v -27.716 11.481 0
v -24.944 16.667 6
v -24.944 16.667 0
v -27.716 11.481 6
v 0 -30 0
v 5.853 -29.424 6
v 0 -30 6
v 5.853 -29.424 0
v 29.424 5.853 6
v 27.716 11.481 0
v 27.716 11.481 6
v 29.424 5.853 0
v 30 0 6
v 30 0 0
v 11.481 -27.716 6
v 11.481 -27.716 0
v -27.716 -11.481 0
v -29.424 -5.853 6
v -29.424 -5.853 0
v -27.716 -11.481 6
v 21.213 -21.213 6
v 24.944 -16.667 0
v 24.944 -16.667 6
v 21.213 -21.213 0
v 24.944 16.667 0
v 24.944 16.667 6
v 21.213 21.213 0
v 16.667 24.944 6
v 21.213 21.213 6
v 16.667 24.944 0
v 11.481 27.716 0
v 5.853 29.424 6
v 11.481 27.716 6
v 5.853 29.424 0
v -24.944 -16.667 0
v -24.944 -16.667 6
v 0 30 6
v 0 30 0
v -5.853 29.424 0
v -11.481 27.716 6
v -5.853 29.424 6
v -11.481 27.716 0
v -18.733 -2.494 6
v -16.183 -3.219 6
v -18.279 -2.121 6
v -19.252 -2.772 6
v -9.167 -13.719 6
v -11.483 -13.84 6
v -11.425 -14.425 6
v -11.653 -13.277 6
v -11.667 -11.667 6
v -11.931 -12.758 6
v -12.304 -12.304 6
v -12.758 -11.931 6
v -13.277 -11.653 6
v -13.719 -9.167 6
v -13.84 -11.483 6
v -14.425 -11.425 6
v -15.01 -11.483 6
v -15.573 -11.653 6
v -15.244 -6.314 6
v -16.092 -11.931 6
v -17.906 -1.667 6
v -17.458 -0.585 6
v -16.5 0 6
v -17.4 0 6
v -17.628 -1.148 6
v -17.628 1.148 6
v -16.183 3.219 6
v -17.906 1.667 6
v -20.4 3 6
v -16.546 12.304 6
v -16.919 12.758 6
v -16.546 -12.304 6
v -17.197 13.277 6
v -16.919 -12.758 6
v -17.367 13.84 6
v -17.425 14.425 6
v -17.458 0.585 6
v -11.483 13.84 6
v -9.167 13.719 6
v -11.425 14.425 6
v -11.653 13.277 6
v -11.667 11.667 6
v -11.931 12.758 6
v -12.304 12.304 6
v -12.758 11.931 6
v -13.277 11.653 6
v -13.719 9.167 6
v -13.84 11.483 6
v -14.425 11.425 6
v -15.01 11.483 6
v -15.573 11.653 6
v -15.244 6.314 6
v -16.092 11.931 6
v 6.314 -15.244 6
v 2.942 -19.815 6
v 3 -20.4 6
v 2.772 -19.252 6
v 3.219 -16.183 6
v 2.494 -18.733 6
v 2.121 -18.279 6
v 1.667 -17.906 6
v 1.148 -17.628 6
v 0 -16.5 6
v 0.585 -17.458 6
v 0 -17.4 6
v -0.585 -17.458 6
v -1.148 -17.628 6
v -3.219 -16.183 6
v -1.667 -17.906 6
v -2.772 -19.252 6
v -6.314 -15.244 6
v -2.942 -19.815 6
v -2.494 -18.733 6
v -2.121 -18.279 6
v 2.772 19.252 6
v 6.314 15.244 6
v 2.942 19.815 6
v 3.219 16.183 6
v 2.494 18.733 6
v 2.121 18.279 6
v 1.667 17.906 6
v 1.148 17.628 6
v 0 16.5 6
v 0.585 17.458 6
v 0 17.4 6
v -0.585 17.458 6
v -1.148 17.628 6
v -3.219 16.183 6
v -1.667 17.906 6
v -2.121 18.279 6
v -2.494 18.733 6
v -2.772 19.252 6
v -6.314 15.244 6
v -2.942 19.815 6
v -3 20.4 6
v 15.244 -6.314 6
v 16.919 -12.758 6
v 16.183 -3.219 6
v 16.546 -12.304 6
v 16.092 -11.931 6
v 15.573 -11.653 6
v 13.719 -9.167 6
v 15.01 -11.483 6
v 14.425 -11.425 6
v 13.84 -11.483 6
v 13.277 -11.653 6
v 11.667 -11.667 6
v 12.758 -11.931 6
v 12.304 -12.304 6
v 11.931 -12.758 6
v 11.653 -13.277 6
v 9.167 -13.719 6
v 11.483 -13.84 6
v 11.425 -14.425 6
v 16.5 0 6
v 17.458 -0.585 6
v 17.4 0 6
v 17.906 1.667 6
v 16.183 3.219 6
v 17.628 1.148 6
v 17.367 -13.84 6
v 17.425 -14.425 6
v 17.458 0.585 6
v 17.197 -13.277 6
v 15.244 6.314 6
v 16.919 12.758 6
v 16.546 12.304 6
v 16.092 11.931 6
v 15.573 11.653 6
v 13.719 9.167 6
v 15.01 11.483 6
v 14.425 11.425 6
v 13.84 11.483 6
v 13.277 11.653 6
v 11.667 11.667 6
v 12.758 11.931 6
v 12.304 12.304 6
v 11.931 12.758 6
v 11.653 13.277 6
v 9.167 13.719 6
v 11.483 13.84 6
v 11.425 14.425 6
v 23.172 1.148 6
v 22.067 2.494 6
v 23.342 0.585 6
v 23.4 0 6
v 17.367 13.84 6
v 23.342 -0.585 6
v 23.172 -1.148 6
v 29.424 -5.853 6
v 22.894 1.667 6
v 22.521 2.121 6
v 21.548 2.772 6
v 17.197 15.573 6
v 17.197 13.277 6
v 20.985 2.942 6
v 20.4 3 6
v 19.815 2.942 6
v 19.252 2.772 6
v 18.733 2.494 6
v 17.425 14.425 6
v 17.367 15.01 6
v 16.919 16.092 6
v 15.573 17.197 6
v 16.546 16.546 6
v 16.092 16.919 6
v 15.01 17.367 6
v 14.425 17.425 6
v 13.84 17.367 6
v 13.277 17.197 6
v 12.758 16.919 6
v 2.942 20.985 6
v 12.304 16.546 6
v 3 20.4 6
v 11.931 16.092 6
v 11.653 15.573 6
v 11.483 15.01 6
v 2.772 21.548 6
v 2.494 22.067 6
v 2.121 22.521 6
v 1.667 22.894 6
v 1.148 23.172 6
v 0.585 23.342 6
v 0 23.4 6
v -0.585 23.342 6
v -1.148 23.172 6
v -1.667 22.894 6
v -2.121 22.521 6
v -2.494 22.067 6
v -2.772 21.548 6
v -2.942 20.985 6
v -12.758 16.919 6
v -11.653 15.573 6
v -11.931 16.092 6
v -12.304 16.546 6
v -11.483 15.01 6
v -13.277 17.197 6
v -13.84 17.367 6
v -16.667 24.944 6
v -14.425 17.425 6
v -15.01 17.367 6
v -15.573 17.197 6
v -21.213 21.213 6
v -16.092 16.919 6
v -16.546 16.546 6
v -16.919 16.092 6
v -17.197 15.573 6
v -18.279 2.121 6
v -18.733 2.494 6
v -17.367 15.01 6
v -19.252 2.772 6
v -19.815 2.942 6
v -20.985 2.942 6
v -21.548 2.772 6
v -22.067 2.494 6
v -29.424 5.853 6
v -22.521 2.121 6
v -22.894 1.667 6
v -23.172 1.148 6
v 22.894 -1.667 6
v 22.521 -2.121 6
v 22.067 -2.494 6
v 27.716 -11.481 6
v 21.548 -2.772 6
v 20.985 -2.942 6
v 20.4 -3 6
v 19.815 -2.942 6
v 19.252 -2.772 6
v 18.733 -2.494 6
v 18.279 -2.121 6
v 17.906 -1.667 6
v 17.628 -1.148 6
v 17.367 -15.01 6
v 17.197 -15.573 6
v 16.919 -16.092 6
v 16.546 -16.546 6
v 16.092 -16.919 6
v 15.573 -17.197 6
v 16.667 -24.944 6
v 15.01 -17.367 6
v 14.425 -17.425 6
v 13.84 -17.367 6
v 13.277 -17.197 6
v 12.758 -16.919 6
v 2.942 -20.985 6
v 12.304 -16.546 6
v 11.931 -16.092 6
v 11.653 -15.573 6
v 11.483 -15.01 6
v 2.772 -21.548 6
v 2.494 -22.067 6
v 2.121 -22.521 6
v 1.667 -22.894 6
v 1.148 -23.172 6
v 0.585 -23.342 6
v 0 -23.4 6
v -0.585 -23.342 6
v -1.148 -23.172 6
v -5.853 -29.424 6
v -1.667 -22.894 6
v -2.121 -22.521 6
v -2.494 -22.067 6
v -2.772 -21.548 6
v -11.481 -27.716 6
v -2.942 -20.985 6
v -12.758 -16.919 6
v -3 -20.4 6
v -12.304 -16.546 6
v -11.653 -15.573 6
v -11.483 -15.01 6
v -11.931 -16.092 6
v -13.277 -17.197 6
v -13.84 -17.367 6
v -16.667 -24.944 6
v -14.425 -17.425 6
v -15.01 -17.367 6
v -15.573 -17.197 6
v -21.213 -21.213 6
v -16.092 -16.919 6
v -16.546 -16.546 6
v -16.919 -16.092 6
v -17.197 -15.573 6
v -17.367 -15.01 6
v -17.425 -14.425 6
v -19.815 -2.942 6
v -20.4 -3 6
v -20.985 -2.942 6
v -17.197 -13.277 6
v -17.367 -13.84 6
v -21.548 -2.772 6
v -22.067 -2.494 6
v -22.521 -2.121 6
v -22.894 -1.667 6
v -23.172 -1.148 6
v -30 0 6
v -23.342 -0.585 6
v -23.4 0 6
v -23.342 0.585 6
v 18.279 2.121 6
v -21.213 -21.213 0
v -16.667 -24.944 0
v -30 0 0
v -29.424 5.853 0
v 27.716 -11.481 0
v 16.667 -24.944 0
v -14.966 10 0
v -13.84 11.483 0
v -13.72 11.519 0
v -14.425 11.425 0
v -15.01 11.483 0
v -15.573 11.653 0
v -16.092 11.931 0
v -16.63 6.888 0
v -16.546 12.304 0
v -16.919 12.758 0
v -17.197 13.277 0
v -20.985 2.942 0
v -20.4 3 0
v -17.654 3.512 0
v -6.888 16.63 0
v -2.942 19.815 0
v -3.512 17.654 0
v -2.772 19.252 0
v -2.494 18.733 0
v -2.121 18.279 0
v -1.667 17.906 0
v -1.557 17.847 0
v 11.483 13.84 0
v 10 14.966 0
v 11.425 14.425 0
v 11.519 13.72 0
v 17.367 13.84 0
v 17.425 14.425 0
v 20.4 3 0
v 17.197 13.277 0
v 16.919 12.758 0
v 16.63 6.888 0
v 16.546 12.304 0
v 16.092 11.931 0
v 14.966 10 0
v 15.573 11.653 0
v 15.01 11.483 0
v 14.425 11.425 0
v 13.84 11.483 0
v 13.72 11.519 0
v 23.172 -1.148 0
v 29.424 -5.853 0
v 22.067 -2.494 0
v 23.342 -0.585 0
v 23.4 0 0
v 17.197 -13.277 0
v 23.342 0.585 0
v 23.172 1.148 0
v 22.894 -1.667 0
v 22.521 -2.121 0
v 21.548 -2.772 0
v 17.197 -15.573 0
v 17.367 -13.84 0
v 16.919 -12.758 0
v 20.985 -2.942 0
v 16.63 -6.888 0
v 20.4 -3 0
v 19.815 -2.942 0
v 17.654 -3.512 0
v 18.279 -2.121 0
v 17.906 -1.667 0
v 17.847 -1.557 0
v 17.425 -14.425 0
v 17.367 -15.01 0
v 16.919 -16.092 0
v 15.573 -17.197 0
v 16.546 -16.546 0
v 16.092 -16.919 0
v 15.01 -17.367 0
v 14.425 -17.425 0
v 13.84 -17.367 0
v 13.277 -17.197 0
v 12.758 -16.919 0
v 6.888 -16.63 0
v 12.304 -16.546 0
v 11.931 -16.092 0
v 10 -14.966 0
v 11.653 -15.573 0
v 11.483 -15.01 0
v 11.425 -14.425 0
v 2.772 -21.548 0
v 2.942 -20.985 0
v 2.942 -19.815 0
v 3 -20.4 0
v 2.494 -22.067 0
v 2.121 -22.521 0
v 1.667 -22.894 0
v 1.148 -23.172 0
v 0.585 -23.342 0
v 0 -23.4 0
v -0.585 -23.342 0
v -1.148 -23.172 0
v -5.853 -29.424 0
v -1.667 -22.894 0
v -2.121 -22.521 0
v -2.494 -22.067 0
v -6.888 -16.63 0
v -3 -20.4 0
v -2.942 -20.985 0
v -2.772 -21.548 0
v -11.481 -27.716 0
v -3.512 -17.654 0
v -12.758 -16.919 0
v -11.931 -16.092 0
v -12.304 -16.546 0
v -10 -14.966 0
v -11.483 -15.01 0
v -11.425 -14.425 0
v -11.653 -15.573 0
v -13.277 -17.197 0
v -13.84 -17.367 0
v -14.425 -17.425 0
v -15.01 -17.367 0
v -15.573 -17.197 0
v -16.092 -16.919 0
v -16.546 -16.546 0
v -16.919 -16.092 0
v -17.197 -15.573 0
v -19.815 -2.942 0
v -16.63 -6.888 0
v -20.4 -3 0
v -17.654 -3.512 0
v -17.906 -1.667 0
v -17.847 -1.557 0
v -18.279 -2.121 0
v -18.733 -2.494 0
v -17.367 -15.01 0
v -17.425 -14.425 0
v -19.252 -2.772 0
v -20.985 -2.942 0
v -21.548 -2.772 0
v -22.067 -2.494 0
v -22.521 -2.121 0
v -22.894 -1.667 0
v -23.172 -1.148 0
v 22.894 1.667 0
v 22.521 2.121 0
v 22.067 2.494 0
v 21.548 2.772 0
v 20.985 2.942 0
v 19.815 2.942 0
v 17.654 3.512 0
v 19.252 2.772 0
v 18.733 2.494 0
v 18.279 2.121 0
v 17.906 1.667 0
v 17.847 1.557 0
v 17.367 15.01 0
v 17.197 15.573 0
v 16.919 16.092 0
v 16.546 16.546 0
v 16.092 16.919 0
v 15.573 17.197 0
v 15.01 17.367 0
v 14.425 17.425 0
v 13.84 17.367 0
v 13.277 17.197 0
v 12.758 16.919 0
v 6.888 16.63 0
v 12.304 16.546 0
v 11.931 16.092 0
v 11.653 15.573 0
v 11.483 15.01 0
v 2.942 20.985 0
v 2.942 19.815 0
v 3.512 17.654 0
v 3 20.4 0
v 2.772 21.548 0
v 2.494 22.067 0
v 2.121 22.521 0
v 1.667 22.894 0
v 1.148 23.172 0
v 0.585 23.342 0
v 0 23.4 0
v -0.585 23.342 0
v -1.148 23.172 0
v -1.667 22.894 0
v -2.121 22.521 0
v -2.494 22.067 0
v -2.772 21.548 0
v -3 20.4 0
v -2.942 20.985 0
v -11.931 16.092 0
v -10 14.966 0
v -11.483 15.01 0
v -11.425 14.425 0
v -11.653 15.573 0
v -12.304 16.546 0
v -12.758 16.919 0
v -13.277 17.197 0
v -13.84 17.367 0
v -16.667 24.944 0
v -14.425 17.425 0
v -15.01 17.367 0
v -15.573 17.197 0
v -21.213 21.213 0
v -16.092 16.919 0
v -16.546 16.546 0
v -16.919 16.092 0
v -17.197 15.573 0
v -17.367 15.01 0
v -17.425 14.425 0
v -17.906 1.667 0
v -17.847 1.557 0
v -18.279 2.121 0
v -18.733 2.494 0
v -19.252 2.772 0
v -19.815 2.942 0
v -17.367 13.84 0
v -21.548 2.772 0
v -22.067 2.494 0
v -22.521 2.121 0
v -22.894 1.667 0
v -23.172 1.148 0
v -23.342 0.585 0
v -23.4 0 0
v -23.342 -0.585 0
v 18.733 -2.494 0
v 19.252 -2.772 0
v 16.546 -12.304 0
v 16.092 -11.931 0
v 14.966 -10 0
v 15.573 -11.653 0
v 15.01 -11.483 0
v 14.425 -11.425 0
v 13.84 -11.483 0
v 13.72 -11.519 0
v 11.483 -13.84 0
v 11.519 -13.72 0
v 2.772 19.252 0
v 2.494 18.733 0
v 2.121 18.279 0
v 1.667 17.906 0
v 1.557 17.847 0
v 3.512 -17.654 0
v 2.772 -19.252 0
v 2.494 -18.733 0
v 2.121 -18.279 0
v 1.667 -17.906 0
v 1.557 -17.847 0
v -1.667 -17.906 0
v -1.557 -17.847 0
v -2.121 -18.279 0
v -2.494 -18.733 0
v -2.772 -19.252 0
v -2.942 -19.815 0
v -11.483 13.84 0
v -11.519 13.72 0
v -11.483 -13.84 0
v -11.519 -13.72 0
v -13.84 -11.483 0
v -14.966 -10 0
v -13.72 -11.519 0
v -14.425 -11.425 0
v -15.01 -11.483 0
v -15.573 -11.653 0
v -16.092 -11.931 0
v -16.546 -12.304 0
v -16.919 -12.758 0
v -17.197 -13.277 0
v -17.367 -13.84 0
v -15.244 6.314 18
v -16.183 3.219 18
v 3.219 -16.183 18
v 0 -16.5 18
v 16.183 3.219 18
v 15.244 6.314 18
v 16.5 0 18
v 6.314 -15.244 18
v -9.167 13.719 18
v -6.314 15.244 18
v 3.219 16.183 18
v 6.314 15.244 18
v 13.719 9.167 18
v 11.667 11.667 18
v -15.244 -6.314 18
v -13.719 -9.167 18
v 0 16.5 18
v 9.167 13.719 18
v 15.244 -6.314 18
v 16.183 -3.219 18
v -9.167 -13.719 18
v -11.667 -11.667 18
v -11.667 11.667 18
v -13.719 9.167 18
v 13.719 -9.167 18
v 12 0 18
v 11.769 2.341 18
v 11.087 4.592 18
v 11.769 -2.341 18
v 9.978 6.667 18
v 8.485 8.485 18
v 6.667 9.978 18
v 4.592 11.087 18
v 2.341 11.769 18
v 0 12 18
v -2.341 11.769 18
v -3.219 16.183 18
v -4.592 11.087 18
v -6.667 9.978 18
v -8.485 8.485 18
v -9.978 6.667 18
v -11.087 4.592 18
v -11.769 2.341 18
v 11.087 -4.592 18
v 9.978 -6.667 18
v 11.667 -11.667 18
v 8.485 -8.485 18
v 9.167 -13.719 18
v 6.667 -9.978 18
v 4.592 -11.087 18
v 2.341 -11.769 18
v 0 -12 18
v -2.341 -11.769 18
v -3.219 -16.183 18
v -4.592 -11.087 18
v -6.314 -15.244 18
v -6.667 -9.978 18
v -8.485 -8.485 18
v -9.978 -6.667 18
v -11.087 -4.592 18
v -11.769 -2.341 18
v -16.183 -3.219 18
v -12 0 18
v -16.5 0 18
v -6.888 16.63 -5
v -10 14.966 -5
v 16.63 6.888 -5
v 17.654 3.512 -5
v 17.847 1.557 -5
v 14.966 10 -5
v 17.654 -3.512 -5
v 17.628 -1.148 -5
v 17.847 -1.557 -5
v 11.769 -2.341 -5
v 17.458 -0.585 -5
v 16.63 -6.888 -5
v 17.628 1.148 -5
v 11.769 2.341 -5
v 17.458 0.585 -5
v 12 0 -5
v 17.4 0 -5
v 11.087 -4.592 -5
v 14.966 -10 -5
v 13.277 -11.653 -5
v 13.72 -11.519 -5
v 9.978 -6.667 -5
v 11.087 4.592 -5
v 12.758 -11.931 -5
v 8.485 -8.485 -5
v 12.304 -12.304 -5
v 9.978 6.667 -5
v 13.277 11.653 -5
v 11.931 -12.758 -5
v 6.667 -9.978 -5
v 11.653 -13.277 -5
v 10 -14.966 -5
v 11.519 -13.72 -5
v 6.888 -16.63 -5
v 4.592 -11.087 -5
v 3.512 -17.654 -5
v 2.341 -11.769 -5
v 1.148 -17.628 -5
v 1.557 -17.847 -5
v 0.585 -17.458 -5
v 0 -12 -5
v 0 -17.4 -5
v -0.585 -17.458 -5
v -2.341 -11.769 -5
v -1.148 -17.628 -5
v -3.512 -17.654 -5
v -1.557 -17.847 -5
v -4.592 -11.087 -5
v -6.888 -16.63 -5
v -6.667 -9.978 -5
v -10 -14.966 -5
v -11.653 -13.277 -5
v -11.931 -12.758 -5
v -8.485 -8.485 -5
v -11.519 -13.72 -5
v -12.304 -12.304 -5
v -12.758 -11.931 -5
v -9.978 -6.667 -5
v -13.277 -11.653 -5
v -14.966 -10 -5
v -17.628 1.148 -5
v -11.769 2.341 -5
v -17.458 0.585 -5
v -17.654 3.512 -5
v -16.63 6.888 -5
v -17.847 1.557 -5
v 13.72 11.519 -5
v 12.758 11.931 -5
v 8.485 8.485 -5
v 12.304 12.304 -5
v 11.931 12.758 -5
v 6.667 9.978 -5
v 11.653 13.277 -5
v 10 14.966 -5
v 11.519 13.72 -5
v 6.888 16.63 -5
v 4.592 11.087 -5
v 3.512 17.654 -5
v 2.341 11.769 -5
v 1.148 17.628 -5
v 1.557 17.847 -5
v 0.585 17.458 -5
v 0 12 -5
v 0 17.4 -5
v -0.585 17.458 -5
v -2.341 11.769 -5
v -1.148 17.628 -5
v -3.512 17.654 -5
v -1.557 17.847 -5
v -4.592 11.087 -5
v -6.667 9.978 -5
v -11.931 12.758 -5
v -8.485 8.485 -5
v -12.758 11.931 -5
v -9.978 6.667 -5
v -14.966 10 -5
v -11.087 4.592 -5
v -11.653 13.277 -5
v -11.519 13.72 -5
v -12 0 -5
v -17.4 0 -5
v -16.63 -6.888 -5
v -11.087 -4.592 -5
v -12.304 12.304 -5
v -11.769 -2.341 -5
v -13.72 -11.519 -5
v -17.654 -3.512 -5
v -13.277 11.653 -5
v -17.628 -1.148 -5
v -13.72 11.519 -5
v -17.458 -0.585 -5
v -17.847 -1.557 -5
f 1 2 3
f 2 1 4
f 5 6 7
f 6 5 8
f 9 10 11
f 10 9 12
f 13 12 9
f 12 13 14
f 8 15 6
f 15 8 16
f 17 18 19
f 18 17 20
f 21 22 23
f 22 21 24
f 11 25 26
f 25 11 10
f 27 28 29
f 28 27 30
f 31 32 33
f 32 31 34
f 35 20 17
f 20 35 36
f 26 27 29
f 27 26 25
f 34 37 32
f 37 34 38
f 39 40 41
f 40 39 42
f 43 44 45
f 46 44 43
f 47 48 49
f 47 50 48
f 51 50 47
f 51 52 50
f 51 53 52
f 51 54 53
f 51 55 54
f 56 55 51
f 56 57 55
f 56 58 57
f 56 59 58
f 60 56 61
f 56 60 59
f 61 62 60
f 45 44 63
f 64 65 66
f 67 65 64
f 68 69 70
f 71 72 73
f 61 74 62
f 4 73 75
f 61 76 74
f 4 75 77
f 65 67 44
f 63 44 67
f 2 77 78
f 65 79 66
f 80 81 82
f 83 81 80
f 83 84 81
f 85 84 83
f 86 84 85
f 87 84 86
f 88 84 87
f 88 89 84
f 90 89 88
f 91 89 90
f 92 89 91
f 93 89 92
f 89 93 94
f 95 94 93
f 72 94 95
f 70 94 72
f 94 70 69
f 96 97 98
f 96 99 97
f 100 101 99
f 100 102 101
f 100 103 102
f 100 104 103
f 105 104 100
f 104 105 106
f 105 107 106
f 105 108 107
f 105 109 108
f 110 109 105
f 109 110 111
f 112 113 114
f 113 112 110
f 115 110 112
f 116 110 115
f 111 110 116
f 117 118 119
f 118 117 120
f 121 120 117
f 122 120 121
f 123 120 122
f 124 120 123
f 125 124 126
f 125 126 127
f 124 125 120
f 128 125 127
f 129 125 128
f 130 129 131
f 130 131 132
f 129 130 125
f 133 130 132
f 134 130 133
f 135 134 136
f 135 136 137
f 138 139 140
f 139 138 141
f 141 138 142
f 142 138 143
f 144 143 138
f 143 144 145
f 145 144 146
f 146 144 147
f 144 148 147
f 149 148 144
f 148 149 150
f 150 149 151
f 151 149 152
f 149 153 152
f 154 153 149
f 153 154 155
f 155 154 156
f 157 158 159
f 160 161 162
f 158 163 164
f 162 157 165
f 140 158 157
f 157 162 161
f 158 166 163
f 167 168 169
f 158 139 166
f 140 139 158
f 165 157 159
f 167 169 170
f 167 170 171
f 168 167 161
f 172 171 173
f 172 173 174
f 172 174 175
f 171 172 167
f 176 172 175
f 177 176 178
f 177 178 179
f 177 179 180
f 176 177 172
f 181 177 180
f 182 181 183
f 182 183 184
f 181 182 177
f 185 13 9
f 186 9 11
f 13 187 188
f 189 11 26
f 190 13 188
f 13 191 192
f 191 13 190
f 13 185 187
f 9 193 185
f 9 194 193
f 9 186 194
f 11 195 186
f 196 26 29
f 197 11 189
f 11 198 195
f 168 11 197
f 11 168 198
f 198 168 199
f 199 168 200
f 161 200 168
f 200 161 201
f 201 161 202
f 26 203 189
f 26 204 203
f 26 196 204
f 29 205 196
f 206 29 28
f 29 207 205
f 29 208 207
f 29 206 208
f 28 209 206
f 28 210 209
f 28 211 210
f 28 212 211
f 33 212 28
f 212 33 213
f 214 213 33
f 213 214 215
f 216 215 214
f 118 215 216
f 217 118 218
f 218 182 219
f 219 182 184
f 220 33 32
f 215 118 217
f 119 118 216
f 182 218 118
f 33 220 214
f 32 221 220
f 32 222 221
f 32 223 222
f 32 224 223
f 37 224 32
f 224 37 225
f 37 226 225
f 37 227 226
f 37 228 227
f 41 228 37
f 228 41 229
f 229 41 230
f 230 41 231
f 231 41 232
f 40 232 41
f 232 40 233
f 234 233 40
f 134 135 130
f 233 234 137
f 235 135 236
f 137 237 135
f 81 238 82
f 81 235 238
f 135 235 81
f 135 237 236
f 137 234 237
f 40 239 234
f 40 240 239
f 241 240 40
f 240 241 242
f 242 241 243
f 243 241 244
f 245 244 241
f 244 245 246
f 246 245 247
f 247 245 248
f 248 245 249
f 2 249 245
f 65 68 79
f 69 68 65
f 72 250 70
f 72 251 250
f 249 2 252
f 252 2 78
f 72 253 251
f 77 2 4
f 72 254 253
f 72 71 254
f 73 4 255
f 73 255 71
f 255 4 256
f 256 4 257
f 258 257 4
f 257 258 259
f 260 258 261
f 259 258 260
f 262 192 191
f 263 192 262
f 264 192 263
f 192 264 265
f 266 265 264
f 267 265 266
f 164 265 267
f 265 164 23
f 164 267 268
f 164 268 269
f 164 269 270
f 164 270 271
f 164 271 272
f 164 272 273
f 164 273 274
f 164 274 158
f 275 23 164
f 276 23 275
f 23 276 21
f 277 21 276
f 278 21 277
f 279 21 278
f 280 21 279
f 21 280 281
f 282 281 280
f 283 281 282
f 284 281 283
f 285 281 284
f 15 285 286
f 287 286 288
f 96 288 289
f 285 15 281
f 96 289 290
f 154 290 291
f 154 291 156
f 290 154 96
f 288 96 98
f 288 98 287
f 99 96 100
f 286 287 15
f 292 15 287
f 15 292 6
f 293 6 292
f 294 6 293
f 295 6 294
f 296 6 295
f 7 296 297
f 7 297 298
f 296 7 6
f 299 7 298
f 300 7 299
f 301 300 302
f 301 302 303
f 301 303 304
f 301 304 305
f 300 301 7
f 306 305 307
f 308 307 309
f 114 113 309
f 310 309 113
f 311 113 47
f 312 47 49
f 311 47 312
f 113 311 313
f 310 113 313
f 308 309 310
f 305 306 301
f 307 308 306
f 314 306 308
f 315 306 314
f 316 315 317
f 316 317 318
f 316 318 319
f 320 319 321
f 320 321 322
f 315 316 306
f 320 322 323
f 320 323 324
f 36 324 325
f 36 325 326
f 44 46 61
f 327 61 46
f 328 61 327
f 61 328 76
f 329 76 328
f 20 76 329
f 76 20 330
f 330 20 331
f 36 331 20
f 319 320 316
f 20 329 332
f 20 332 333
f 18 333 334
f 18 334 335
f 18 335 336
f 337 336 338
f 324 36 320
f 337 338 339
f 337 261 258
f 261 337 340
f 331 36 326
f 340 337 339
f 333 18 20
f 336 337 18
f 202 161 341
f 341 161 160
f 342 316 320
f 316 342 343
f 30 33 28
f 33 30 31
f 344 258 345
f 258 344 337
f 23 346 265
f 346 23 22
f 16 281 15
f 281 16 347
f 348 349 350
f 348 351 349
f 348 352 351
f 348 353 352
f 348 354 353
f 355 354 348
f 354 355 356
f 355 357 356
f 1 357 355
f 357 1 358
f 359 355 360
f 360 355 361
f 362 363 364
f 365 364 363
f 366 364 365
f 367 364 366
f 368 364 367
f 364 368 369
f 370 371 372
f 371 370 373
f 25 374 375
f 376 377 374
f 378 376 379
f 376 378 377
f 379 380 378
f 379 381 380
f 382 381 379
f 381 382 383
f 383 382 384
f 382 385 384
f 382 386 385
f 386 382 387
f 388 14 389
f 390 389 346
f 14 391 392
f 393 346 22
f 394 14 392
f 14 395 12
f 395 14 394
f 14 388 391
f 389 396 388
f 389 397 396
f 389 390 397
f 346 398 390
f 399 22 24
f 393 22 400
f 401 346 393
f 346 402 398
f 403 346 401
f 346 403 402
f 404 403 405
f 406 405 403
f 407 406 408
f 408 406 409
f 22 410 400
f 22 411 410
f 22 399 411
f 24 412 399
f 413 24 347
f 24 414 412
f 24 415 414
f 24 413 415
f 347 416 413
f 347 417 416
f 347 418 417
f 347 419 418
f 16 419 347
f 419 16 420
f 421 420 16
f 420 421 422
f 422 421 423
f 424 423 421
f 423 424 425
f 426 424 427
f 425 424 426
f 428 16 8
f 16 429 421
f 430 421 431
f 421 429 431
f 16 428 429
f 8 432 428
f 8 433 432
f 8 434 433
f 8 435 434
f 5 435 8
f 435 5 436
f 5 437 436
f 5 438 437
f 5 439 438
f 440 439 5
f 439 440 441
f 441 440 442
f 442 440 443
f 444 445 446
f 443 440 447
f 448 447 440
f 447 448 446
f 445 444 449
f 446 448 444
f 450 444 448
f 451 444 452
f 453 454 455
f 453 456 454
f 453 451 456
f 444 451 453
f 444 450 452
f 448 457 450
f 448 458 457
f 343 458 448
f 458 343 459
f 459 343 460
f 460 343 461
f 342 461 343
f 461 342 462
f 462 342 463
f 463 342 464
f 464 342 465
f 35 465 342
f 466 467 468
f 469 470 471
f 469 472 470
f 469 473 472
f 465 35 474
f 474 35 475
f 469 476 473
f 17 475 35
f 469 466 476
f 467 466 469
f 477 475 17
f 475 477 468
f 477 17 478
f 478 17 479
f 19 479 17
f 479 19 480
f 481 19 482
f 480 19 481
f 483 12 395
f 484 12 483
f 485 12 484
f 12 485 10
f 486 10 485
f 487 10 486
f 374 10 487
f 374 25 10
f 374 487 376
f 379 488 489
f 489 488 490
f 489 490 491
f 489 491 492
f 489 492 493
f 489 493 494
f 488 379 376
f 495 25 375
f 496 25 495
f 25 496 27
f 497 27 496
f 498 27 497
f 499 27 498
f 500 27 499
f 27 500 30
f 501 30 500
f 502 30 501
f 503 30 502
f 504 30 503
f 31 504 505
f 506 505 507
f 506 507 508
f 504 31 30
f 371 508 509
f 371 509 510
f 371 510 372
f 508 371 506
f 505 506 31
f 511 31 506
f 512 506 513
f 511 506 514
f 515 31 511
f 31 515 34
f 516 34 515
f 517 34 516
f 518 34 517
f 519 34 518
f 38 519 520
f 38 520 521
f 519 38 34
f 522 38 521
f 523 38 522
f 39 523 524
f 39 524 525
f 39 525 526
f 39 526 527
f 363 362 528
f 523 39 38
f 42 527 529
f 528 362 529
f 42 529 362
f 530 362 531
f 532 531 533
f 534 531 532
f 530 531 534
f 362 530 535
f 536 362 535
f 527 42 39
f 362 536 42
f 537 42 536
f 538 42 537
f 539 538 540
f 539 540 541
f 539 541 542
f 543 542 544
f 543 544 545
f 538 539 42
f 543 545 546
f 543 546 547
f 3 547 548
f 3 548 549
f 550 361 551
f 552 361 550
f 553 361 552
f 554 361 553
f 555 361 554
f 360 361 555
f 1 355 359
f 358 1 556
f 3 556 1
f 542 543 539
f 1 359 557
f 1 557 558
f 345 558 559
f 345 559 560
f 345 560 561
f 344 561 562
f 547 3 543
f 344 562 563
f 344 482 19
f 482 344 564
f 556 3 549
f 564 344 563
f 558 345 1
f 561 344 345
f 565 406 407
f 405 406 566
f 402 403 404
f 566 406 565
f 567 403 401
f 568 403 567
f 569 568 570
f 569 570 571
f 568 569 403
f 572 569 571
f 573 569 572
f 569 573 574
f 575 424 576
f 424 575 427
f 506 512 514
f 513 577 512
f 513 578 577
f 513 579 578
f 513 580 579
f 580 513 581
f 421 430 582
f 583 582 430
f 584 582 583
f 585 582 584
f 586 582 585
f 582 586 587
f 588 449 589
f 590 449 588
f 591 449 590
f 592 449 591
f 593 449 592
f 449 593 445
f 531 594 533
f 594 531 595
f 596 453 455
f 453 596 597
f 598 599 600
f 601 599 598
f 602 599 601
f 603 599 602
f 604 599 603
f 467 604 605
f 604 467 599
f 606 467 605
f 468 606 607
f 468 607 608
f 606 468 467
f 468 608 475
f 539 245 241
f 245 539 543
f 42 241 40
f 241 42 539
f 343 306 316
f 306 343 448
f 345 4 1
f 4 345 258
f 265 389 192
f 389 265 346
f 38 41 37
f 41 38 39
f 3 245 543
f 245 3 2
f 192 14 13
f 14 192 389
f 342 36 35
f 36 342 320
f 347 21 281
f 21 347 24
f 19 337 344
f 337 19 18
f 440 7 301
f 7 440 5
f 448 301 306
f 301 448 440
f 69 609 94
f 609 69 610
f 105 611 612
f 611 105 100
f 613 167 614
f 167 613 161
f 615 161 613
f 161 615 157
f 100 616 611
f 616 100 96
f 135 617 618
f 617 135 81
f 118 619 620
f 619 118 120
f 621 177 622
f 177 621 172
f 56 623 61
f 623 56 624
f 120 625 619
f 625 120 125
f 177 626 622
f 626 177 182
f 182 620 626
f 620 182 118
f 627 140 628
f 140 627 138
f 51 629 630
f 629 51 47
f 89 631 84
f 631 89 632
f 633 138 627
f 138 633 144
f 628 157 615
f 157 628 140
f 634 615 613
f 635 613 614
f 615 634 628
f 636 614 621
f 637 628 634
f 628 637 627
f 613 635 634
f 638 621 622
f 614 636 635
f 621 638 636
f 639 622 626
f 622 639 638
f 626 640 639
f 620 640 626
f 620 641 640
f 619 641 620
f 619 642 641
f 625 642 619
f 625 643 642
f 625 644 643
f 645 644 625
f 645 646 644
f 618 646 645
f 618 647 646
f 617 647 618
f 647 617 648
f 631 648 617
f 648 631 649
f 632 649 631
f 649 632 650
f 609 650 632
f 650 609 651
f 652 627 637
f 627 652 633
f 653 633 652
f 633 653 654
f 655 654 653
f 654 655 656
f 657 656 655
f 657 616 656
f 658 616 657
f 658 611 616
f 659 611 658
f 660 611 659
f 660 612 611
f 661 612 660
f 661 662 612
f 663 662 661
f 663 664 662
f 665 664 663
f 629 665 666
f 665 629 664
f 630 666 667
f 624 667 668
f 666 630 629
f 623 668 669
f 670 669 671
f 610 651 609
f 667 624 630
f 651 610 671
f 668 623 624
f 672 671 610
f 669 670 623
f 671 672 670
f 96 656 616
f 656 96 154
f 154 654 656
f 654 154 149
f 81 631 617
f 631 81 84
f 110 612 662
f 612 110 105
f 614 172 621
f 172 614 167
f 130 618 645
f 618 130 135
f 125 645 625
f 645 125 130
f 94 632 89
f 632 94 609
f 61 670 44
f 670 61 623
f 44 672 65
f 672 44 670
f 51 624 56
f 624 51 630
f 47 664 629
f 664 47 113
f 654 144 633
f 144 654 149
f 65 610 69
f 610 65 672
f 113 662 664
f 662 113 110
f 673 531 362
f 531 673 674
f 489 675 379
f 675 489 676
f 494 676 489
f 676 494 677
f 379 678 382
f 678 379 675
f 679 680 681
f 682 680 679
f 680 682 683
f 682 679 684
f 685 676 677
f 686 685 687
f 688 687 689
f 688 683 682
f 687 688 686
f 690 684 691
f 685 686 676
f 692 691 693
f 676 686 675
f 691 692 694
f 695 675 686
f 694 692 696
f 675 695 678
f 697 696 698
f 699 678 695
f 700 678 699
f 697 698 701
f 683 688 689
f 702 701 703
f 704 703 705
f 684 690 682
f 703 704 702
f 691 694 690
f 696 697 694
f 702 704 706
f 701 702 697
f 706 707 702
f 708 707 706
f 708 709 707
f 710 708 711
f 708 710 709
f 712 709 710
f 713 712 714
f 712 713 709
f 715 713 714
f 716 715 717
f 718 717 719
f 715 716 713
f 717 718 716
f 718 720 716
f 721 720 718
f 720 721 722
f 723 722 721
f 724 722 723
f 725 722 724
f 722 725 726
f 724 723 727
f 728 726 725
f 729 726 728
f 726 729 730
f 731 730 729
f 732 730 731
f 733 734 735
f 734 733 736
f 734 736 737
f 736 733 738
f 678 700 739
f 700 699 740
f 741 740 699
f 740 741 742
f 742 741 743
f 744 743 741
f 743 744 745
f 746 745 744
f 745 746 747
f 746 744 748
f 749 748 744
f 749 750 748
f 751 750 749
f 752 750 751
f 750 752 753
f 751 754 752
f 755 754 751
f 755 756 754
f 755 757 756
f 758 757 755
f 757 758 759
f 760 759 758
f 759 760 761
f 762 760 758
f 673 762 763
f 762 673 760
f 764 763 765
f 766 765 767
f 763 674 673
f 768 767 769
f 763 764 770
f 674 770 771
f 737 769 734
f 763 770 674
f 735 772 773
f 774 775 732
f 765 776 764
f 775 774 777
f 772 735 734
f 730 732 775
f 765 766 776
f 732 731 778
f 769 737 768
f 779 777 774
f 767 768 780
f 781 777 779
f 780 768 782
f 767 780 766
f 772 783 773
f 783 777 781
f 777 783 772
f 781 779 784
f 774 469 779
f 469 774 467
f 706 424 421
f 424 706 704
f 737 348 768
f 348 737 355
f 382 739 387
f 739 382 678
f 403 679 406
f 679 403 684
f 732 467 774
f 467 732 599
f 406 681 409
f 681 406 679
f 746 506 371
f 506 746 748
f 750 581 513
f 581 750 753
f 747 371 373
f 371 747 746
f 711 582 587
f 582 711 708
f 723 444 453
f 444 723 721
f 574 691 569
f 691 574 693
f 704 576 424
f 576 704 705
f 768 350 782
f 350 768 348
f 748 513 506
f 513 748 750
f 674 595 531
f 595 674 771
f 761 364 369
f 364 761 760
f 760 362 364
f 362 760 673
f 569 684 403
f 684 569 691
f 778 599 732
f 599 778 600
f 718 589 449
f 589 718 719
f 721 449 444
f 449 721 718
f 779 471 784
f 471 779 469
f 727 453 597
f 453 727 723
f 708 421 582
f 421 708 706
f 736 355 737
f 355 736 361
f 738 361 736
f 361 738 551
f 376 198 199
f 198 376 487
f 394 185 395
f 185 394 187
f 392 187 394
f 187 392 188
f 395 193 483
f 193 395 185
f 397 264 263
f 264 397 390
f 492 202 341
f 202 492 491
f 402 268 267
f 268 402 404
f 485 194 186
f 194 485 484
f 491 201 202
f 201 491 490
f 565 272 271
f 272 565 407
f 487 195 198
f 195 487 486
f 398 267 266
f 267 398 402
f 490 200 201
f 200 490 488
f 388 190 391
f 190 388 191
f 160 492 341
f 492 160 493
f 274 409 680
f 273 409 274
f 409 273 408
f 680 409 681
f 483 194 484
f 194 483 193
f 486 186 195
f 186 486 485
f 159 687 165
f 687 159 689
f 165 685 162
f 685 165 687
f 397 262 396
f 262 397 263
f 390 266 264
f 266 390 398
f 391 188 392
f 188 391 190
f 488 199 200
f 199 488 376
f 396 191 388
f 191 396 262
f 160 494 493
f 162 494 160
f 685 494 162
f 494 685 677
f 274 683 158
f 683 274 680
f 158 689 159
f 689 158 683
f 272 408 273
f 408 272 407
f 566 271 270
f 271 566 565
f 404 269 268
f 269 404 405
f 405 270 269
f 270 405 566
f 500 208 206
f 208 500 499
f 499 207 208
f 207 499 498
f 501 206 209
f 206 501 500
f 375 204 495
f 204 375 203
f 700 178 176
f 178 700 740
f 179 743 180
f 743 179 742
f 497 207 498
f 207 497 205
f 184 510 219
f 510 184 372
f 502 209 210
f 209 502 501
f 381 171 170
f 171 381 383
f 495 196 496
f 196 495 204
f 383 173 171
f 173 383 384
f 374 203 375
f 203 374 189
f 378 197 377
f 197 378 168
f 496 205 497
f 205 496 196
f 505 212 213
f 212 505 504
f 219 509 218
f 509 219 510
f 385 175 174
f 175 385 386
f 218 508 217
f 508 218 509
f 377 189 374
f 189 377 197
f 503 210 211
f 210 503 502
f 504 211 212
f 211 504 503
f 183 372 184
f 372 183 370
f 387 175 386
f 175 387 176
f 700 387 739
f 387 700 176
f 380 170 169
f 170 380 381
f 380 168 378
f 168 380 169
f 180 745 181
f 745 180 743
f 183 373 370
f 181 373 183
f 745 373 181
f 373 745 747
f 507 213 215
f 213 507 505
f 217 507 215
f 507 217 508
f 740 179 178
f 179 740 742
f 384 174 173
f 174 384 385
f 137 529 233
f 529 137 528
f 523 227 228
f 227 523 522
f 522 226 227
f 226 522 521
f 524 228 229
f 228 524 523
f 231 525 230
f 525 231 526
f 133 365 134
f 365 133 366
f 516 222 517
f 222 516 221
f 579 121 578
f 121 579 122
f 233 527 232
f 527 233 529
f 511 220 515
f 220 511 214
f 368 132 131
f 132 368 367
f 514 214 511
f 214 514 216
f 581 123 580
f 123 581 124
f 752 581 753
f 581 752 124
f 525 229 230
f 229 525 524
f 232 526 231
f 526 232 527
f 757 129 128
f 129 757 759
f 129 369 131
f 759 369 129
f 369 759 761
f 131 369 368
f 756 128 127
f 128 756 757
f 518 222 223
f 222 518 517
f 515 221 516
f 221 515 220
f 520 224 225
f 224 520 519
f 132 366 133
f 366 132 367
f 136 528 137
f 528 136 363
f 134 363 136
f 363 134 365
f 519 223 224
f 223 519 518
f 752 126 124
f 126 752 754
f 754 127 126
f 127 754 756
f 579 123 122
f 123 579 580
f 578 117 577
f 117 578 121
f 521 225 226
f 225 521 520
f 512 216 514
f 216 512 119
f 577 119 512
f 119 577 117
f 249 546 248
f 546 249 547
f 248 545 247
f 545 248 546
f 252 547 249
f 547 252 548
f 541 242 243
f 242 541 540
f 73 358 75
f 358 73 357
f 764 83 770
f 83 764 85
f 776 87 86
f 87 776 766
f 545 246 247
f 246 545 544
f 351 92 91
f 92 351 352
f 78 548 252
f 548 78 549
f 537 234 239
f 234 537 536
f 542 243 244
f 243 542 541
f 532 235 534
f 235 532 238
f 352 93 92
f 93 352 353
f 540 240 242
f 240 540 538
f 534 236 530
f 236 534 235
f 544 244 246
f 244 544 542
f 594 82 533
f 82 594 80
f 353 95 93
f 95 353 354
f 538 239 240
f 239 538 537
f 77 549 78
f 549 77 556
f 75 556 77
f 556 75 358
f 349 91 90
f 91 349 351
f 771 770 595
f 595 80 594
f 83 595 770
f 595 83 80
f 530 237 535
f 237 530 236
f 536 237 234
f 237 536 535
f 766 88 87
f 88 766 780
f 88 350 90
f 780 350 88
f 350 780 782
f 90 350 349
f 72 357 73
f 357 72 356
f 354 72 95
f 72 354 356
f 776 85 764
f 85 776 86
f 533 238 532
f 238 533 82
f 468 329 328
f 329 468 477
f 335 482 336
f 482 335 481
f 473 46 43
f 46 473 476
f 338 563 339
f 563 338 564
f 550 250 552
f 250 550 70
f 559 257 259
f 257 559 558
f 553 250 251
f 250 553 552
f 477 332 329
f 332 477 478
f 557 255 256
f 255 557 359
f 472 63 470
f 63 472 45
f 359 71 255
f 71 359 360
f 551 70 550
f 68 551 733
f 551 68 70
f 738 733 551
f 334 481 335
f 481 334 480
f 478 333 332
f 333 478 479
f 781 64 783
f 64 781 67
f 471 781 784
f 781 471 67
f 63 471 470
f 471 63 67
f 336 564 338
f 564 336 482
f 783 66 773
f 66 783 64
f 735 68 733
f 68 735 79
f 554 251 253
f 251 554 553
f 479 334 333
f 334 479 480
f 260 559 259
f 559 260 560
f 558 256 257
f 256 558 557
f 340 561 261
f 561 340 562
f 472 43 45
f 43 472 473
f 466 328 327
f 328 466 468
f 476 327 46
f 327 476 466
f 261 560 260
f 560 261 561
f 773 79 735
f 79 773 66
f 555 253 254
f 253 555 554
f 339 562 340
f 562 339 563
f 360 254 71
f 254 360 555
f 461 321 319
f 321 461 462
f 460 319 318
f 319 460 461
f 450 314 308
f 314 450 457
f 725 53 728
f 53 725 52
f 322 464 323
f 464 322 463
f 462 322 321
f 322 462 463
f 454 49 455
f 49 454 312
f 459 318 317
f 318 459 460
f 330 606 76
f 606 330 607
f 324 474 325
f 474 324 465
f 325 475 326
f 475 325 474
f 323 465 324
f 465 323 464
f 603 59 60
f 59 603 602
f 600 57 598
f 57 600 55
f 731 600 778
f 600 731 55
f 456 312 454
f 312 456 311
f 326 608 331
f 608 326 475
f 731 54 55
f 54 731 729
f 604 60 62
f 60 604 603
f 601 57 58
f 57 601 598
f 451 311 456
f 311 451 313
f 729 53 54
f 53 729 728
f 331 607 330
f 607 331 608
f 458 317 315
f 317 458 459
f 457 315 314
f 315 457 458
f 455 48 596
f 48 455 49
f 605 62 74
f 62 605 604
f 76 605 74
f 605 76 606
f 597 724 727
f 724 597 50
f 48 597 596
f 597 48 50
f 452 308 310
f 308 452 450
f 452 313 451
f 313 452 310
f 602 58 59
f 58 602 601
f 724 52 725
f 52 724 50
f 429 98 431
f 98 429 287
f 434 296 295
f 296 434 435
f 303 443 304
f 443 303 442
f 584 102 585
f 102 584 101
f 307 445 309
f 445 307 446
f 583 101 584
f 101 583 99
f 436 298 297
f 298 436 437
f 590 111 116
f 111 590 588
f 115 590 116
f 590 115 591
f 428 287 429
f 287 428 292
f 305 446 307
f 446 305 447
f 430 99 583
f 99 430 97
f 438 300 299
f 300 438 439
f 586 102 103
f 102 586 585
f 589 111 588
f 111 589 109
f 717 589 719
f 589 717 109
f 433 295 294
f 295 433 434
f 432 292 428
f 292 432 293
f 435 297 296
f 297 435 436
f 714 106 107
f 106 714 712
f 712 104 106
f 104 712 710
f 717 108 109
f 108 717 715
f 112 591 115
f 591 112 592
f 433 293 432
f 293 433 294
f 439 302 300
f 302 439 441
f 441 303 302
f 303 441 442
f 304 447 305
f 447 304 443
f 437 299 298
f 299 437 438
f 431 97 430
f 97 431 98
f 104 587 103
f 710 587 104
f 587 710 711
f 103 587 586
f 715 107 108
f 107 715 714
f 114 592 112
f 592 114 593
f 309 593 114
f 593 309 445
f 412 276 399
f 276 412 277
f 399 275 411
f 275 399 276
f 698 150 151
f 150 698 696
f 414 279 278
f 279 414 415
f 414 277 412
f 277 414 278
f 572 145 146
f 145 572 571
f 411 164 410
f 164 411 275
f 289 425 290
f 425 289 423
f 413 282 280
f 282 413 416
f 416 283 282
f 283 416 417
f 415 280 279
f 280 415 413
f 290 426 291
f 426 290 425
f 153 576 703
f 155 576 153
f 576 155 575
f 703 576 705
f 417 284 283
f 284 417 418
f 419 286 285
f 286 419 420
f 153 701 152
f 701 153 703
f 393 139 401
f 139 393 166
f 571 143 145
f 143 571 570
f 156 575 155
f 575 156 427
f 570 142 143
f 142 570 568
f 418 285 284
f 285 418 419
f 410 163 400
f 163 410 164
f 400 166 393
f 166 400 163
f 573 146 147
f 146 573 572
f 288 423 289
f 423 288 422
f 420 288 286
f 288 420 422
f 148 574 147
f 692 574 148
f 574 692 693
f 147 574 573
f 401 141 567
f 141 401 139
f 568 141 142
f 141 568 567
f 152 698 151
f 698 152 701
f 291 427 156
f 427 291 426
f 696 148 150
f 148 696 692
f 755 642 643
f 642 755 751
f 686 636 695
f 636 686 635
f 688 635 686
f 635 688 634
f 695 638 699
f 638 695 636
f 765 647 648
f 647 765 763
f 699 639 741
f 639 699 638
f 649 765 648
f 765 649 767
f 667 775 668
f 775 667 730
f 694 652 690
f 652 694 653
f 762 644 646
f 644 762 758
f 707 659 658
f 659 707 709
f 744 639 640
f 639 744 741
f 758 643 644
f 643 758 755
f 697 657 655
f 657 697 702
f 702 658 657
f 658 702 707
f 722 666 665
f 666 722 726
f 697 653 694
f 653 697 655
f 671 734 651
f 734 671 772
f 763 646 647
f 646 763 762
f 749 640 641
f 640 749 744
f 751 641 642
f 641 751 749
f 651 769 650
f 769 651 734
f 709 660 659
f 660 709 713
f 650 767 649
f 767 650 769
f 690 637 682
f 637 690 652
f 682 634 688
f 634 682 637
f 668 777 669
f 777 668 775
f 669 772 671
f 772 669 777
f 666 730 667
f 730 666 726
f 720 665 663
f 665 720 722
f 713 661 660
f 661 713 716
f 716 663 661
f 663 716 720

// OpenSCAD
$fn = 32;

// ----------------------------------------------------------------------
// Bolt-circle flange: 60 mm outside, 8 bolt holes, bore 24 mm
// ----------------------------------------------------------------------

// --- parameters (mm) ---
flange_d = 60;            // flange outside diameter
flange_t = 6;             // flange thickness
bolts = 8;                // number of bolt holes
bolt_d = 6;               // bolt clearance
bolt_r = 20.4;            // bolt circle radius
bore_d = 24;              // centre bore
hub_d = 33;               // raised hub diameter
hub_h = 12;               // raised hub height
spigot_d = 36;            // spigot diameter
spigot_h = 6;             // spigot height below the flange
sink = 1;                 // overlap into the flange

module body() {
  cylinder(h = flange_t, d = flange_d);
  /* raised hub, sunk 1 mm into the flange */
  translate([0, 0, flange_t - 1]) cylinder(h = hub_h + 1, d = hub_d);
  /* spigot on the back face, sunk into the flange */
  translate([0, 0, -spigot_h + sink]) cylinder(h = spigot_h, d = spigot_d);
}

difference() {
  body();
  /* bolt circle */
  for (i = [0 : bolts - 1]) rotate([0, 0, i * 360 / bolts]) translate([bolt_r, 0, -spigot_h - 1]) cylinder(h = flange_t + hub_h + spigot_h + 3, d = bolt_d);
  translate([0, 0, -spigot_h - 1]) cylinder(h = flange_t + hub_h + spigot_h + 3, d = bore_d);
}
